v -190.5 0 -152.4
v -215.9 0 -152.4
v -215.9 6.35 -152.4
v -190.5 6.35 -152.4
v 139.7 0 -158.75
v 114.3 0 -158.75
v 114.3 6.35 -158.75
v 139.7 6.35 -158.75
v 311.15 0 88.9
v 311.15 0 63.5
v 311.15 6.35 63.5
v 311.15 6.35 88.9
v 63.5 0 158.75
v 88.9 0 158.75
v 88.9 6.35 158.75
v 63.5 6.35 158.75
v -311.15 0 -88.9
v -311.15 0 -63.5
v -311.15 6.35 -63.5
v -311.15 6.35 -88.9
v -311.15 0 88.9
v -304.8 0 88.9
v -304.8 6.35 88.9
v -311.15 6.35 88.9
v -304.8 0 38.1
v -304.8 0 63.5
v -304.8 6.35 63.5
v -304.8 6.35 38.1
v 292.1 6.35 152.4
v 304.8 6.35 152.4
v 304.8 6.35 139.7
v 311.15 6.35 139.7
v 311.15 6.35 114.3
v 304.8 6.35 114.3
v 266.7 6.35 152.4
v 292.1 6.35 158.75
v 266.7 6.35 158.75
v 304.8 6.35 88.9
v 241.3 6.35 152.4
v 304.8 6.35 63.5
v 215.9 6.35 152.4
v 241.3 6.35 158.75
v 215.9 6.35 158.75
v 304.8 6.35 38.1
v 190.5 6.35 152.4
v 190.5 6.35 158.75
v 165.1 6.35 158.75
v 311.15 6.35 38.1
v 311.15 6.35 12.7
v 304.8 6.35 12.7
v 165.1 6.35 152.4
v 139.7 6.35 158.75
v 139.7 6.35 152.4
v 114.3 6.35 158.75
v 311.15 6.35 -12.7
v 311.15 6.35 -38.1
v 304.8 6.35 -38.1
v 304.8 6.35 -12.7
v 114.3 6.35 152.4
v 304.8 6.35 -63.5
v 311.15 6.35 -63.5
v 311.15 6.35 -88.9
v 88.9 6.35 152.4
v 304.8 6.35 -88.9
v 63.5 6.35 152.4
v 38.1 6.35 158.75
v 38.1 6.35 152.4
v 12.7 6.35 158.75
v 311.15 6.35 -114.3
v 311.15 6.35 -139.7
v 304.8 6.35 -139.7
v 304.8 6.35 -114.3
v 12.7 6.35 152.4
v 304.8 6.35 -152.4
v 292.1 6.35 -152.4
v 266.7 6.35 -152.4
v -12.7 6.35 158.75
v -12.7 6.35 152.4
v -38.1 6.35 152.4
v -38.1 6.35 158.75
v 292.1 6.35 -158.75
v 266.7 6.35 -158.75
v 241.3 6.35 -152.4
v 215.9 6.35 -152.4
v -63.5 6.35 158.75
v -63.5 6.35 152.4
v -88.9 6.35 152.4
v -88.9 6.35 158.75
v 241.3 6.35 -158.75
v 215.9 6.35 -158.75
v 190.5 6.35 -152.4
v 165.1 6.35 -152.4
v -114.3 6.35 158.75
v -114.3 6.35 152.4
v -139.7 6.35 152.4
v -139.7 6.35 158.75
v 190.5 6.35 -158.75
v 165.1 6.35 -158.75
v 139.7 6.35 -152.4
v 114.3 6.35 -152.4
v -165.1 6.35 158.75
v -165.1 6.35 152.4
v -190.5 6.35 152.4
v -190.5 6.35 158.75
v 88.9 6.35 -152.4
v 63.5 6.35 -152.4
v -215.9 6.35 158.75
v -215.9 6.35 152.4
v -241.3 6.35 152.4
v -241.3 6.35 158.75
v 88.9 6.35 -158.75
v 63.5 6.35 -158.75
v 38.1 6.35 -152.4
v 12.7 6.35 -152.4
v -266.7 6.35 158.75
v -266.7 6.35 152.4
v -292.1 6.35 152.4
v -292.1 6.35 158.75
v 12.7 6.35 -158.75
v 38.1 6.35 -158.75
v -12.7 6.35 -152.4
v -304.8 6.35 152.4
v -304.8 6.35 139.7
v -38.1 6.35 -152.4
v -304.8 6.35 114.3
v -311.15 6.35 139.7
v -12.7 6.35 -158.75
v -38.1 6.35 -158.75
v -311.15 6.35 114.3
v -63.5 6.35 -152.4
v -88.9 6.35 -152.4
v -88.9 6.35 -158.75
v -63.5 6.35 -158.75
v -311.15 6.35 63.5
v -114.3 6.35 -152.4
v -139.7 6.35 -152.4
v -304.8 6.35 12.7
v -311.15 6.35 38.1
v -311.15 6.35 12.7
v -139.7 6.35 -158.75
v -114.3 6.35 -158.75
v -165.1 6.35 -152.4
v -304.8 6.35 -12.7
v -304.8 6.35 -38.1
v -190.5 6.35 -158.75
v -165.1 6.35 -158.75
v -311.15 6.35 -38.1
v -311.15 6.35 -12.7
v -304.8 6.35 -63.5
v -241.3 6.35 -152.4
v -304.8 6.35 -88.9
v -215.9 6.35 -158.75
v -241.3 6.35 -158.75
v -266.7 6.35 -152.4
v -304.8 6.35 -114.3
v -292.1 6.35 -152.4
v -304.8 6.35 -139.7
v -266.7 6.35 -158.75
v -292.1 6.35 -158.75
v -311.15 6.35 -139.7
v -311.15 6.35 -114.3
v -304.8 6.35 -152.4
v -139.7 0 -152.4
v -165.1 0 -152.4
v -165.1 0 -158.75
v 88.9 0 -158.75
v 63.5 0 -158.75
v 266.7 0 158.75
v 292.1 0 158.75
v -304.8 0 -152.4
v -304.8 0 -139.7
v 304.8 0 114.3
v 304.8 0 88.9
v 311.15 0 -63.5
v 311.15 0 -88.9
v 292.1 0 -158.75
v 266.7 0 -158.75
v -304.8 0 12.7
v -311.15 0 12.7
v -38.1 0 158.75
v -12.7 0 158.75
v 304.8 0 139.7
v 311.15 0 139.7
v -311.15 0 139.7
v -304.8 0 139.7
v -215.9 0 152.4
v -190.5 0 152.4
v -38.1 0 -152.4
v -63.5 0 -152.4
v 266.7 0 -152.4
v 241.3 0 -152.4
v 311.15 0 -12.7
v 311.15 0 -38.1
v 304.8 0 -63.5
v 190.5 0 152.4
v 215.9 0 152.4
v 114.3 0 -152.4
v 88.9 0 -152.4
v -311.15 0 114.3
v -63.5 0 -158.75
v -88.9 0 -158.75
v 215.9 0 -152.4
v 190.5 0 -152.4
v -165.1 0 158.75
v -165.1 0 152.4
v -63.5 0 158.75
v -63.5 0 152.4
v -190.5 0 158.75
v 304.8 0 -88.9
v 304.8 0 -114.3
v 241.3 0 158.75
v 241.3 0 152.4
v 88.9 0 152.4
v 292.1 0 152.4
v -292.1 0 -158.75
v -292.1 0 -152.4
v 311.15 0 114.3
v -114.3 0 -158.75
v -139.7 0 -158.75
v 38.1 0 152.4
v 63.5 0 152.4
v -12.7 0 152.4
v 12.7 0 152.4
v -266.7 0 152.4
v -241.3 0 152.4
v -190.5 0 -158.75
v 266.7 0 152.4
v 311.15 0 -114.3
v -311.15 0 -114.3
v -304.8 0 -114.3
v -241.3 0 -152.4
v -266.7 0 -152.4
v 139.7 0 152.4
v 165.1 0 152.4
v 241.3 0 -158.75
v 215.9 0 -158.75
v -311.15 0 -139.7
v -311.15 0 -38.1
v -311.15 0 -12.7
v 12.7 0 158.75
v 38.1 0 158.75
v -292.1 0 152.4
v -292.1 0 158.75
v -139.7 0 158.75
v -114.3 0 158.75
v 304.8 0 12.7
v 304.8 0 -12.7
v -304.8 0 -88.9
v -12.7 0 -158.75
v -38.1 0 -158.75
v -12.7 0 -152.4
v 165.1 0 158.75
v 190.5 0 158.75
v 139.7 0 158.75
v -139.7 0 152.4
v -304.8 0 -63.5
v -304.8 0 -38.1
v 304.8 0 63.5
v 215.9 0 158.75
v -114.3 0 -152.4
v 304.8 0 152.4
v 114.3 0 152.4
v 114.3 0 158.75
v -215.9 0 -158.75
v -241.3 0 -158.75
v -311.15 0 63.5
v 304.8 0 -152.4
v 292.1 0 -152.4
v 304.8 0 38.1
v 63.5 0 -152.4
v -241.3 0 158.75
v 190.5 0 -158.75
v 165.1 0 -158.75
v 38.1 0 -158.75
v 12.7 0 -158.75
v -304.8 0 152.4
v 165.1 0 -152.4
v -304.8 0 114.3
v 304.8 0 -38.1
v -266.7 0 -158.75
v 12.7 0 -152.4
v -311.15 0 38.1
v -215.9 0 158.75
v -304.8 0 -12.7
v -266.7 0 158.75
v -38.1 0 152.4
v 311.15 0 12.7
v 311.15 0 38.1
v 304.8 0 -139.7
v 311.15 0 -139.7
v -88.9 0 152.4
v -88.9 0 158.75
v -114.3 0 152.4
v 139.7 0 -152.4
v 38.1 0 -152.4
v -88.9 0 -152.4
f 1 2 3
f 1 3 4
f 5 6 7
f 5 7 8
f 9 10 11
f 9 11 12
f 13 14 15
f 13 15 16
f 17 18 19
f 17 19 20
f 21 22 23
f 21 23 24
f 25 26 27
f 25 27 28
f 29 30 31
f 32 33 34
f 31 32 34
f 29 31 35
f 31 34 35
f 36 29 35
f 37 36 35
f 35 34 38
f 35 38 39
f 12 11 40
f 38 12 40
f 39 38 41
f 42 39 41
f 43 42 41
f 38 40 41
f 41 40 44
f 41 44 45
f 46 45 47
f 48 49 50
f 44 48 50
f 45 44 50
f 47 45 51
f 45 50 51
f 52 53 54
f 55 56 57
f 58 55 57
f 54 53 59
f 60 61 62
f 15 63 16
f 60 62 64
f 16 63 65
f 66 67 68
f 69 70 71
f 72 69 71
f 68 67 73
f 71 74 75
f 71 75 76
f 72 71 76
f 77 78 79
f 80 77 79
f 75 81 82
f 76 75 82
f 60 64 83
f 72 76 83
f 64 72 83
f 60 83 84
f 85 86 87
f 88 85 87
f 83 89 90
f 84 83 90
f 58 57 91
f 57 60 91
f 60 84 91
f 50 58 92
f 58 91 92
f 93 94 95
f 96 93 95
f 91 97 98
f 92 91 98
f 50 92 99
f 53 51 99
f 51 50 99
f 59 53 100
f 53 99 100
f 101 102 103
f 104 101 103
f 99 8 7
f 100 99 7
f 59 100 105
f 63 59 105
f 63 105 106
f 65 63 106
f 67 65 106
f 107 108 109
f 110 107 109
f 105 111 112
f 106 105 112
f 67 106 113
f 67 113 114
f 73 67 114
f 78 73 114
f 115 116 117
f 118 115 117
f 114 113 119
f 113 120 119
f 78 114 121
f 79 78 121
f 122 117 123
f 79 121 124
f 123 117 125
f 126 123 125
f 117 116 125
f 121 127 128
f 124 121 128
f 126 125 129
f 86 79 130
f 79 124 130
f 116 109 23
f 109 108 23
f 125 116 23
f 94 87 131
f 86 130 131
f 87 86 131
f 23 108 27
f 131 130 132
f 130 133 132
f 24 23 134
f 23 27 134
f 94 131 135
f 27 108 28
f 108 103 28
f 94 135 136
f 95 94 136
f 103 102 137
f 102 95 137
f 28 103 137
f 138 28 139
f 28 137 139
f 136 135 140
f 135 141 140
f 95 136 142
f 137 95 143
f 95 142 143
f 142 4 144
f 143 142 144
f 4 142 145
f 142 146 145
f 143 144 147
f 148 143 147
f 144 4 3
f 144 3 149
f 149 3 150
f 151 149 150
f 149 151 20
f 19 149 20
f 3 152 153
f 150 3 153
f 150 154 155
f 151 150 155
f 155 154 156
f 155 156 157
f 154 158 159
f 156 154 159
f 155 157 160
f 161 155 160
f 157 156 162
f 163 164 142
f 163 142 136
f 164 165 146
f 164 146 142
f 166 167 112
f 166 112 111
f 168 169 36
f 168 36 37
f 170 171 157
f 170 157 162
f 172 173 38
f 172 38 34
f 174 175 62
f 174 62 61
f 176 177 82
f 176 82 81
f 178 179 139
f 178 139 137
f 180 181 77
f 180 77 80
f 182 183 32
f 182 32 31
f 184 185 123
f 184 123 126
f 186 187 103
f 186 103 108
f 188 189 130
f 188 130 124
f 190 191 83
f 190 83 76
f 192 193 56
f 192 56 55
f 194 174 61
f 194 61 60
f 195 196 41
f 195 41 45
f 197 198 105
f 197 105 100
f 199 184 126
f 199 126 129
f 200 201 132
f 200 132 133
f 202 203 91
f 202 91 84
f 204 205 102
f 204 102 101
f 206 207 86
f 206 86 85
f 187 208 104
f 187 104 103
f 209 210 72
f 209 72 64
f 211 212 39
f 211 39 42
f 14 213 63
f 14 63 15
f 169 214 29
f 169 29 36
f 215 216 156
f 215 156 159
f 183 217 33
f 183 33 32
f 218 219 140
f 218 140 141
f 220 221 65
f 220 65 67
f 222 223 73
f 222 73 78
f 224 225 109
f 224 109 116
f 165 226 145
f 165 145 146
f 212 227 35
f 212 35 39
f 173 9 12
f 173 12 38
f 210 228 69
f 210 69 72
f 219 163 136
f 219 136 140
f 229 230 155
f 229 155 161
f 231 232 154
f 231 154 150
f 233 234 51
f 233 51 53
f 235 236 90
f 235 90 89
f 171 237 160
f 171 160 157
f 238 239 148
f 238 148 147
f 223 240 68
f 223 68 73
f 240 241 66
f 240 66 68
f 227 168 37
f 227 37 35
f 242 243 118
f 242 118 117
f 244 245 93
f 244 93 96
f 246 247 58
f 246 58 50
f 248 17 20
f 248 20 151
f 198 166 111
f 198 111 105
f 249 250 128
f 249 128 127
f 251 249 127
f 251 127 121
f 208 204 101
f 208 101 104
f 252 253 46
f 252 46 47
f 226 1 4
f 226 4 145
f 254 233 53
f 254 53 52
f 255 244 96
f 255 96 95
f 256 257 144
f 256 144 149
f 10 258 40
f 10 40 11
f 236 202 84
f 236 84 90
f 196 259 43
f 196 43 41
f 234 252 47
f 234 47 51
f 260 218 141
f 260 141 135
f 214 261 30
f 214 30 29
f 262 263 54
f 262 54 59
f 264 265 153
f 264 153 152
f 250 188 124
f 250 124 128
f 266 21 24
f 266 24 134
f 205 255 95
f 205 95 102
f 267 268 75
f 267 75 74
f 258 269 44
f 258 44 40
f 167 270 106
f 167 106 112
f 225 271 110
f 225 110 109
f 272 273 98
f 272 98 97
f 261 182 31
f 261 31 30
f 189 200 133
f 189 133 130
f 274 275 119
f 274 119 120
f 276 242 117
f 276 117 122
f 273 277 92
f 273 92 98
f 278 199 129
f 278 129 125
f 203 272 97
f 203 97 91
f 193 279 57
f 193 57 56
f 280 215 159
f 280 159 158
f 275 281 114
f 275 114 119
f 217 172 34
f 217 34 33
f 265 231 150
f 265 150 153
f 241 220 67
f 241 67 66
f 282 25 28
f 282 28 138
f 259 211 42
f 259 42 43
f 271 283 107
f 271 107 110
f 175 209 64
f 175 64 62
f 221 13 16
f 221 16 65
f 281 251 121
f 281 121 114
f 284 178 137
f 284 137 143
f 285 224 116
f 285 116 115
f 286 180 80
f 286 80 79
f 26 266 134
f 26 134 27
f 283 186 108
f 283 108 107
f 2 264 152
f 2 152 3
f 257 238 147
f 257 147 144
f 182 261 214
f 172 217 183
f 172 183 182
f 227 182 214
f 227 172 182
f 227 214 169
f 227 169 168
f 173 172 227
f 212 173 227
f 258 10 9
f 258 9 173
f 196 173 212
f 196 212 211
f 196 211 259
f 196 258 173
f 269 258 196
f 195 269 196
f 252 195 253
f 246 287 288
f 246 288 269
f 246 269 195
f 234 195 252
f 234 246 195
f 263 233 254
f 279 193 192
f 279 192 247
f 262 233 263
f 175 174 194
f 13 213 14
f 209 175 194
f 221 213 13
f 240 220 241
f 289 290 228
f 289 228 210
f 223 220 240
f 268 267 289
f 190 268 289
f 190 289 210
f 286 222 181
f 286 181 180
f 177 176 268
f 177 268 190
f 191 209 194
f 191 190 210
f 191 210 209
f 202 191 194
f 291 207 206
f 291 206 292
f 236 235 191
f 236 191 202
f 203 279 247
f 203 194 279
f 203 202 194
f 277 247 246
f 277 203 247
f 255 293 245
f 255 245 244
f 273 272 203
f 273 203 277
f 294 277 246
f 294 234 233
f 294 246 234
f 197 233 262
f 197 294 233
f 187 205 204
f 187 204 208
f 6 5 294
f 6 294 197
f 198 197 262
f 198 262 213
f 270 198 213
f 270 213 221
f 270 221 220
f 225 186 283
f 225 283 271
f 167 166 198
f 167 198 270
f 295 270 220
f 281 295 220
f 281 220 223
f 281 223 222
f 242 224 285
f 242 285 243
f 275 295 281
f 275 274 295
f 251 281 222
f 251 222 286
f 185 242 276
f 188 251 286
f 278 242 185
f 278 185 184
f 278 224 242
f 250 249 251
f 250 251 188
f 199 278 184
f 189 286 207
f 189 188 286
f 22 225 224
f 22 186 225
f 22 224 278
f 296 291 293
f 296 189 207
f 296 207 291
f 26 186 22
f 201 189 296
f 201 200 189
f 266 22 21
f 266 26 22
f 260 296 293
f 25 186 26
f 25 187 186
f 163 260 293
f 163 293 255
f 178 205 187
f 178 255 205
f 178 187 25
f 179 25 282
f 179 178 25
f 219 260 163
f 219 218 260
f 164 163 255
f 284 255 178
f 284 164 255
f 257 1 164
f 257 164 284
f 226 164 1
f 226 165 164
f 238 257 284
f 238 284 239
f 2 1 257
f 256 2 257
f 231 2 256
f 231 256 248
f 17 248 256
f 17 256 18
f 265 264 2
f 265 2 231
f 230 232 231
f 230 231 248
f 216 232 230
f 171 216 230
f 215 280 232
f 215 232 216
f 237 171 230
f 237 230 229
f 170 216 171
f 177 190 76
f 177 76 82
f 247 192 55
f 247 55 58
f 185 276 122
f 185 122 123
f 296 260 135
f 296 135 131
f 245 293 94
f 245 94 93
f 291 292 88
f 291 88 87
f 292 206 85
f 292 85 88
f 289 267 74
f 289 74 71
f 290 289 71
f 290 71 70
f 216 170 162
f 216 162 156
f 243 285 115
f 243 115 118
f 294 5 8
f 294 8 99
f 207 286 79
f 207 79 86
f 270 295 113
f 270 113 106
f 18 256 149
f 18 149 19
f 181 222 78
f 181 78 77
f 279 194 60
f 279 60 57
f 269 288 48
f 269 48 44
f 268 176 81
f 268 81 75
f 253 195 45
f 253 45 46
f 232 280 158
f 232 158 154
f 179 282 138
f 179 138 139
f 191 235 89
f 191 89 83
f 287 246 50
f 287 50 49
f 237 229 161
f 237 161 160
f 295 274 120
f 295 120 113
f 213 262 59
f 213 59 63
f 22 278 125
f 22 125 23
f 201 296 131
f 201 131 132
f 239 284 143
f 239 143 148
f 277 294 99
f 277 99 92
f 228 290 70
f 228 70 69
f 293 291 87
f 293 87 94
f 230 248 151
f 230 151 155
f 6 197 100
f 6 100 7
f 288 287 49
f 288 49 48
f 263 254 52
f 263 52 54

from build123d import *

# Parameters (mm, degrees)
BOSS_EXTRUDE1_DEPTH = 6.35


with BuildPart() as part:
    # Sketch2 → Boss-Extrude1 (new body)
    with BuildSketch(Plane(origin=(0, 0, 0), x_dir=(1, 0, 0), z_dir=(0, 1, 0))):
        Polygon((-292.1, 152.4), (-292.1, 158.75), (-266.7, 158.75), (-266.7, 152.4), (-241.3, 152.4), (-241.3, 158.75), (-215.9, 158.75), (-215.9, 152.4), (-190.5, 152.4), (-190.5, 158.75), (-165.1, 158.75), (-165.1, 152.4), (-139.7, 152.4), (-139.7, 158.75), (-114.3, 158.75), (-114.3, 152.4), (-88.9, 152.4), (-88.9, 158.75), (-63.5, 158.75), (-63.5, 152.4), (-38.1, 152.4), (-38.1, 158.75), (-12.7, 158.75), (-12.7, 152.4), (12.7, 152.4), (12.7, 158.75), (38.1, 158.75), (38.1, 152.4), (63.5, 152.4), (63.5, 158.75), (88.9, 158.75), (88.9, 152.4), (114.3, 152.4), (114.3, 158.75), (139.7, 158.75), (139.7, 152.4), (165.1, 152.4), (165.1, 158.75), (190.5, 158.75), (190.5, 152.4), (215.9, 152.4), (215.9, 158.75), (241.3, 158.75), (241.3, 152.4), (266.7, 152.4), (266.7, 158.75), (292.1, 158.75), (292.1, 152.4), (304.8, 152.4), (304.8, 139.7), (311.15, 139.7), (311.15, 114.3), (304.8, 114.3), (304.8, 88.9), (311.15, 88.9), (311.15, 63.5), (304.8, 63.5), (304.8, 38.1), (311.15, 38.1), (311.15, 12.7), (304.8, 12.7), (304.8, -12.7), (311.15, -12.7), (311.15, -38.1), (304.8, -38.1), (304.8, -63.5), (311.15, -63.5), (311.15, -88.9), (304.8, -88.9), (304.8, -114.3), (311.15, -114.3), (311.15, -139.7), (304.8, -139.7), (304.8, -152.4), (292.1, -152.4), (292.1, -158.75), (266.7, -158.75), (266.7, -152.4), (241.3, -152.4), (241.3, -158.75), (215.9, -158.75), (215.9, -152.4), (190.5, -152.4), (190.5, -158.75), (165.1, -158.75), (165.1, -152.4), (139.7, -152.4), (139.7, -158.75), (114.3, -158.75), (114.3, -152.4), (88.9, -152.4), (88.9, -158.75), (63.5, -158.75), (63.5, -152.4), (38.1, -152.4), (38.1, -158.75), (12.7, -158.75), (12.7, -152.4), (-12.7, -152.4), (-12.7, -158.75), (-38.1, -158.75), (-38.1, -152.4), (-63.5, -152.4), (-63.5, -158.75), (-88.9, -158.75), (-88.9, -152.4), (-114.3, -152.4), (-114.3, -158.75), (-139.7, -158.75), (-139.7, -152.4), (-165.1, -152.4), (-165.1, -158.75), (-190.5, -158.75), (-190.5, -152.4), (-215.9, -152.4), (-215.9, -158.75), (-241.3, -158.75), (-241.3, -152.4), (-266.7, -152.4), (-266.7, -158.75), (-292.1, -158.75), (-292.1, -152.4), (-304.8, -152.4), (-304.8, -139.7), (-311.15, -139.7), (-311.15, -114.3), (-304.8, -114.3), (-304.8, -88.9), (-311.15, -88.9), (-311.15, -63.5), (-304.8, -63.5), (-304.8, -38.1), (-311.15, -38.1), (-311.15, -12.7), (-304.8, -12.7), (-304.8, 12.7), (-311.15, 12.7), (-311.15, 38.1), (-304.8, 38.1), (-304.8, 63.5), (-311.15, 63.5), (-311.15, 88.9), (-304.8, 88.9), (-304.8, 114.3), (-311.15, 114.3), (-311.15, 139.7), (-304.8, 139.7), (-304.8, 152.4), align=None)
    extrude(amount=BOSS_EXTRUDE1_DEPTH)


solid = part.part
